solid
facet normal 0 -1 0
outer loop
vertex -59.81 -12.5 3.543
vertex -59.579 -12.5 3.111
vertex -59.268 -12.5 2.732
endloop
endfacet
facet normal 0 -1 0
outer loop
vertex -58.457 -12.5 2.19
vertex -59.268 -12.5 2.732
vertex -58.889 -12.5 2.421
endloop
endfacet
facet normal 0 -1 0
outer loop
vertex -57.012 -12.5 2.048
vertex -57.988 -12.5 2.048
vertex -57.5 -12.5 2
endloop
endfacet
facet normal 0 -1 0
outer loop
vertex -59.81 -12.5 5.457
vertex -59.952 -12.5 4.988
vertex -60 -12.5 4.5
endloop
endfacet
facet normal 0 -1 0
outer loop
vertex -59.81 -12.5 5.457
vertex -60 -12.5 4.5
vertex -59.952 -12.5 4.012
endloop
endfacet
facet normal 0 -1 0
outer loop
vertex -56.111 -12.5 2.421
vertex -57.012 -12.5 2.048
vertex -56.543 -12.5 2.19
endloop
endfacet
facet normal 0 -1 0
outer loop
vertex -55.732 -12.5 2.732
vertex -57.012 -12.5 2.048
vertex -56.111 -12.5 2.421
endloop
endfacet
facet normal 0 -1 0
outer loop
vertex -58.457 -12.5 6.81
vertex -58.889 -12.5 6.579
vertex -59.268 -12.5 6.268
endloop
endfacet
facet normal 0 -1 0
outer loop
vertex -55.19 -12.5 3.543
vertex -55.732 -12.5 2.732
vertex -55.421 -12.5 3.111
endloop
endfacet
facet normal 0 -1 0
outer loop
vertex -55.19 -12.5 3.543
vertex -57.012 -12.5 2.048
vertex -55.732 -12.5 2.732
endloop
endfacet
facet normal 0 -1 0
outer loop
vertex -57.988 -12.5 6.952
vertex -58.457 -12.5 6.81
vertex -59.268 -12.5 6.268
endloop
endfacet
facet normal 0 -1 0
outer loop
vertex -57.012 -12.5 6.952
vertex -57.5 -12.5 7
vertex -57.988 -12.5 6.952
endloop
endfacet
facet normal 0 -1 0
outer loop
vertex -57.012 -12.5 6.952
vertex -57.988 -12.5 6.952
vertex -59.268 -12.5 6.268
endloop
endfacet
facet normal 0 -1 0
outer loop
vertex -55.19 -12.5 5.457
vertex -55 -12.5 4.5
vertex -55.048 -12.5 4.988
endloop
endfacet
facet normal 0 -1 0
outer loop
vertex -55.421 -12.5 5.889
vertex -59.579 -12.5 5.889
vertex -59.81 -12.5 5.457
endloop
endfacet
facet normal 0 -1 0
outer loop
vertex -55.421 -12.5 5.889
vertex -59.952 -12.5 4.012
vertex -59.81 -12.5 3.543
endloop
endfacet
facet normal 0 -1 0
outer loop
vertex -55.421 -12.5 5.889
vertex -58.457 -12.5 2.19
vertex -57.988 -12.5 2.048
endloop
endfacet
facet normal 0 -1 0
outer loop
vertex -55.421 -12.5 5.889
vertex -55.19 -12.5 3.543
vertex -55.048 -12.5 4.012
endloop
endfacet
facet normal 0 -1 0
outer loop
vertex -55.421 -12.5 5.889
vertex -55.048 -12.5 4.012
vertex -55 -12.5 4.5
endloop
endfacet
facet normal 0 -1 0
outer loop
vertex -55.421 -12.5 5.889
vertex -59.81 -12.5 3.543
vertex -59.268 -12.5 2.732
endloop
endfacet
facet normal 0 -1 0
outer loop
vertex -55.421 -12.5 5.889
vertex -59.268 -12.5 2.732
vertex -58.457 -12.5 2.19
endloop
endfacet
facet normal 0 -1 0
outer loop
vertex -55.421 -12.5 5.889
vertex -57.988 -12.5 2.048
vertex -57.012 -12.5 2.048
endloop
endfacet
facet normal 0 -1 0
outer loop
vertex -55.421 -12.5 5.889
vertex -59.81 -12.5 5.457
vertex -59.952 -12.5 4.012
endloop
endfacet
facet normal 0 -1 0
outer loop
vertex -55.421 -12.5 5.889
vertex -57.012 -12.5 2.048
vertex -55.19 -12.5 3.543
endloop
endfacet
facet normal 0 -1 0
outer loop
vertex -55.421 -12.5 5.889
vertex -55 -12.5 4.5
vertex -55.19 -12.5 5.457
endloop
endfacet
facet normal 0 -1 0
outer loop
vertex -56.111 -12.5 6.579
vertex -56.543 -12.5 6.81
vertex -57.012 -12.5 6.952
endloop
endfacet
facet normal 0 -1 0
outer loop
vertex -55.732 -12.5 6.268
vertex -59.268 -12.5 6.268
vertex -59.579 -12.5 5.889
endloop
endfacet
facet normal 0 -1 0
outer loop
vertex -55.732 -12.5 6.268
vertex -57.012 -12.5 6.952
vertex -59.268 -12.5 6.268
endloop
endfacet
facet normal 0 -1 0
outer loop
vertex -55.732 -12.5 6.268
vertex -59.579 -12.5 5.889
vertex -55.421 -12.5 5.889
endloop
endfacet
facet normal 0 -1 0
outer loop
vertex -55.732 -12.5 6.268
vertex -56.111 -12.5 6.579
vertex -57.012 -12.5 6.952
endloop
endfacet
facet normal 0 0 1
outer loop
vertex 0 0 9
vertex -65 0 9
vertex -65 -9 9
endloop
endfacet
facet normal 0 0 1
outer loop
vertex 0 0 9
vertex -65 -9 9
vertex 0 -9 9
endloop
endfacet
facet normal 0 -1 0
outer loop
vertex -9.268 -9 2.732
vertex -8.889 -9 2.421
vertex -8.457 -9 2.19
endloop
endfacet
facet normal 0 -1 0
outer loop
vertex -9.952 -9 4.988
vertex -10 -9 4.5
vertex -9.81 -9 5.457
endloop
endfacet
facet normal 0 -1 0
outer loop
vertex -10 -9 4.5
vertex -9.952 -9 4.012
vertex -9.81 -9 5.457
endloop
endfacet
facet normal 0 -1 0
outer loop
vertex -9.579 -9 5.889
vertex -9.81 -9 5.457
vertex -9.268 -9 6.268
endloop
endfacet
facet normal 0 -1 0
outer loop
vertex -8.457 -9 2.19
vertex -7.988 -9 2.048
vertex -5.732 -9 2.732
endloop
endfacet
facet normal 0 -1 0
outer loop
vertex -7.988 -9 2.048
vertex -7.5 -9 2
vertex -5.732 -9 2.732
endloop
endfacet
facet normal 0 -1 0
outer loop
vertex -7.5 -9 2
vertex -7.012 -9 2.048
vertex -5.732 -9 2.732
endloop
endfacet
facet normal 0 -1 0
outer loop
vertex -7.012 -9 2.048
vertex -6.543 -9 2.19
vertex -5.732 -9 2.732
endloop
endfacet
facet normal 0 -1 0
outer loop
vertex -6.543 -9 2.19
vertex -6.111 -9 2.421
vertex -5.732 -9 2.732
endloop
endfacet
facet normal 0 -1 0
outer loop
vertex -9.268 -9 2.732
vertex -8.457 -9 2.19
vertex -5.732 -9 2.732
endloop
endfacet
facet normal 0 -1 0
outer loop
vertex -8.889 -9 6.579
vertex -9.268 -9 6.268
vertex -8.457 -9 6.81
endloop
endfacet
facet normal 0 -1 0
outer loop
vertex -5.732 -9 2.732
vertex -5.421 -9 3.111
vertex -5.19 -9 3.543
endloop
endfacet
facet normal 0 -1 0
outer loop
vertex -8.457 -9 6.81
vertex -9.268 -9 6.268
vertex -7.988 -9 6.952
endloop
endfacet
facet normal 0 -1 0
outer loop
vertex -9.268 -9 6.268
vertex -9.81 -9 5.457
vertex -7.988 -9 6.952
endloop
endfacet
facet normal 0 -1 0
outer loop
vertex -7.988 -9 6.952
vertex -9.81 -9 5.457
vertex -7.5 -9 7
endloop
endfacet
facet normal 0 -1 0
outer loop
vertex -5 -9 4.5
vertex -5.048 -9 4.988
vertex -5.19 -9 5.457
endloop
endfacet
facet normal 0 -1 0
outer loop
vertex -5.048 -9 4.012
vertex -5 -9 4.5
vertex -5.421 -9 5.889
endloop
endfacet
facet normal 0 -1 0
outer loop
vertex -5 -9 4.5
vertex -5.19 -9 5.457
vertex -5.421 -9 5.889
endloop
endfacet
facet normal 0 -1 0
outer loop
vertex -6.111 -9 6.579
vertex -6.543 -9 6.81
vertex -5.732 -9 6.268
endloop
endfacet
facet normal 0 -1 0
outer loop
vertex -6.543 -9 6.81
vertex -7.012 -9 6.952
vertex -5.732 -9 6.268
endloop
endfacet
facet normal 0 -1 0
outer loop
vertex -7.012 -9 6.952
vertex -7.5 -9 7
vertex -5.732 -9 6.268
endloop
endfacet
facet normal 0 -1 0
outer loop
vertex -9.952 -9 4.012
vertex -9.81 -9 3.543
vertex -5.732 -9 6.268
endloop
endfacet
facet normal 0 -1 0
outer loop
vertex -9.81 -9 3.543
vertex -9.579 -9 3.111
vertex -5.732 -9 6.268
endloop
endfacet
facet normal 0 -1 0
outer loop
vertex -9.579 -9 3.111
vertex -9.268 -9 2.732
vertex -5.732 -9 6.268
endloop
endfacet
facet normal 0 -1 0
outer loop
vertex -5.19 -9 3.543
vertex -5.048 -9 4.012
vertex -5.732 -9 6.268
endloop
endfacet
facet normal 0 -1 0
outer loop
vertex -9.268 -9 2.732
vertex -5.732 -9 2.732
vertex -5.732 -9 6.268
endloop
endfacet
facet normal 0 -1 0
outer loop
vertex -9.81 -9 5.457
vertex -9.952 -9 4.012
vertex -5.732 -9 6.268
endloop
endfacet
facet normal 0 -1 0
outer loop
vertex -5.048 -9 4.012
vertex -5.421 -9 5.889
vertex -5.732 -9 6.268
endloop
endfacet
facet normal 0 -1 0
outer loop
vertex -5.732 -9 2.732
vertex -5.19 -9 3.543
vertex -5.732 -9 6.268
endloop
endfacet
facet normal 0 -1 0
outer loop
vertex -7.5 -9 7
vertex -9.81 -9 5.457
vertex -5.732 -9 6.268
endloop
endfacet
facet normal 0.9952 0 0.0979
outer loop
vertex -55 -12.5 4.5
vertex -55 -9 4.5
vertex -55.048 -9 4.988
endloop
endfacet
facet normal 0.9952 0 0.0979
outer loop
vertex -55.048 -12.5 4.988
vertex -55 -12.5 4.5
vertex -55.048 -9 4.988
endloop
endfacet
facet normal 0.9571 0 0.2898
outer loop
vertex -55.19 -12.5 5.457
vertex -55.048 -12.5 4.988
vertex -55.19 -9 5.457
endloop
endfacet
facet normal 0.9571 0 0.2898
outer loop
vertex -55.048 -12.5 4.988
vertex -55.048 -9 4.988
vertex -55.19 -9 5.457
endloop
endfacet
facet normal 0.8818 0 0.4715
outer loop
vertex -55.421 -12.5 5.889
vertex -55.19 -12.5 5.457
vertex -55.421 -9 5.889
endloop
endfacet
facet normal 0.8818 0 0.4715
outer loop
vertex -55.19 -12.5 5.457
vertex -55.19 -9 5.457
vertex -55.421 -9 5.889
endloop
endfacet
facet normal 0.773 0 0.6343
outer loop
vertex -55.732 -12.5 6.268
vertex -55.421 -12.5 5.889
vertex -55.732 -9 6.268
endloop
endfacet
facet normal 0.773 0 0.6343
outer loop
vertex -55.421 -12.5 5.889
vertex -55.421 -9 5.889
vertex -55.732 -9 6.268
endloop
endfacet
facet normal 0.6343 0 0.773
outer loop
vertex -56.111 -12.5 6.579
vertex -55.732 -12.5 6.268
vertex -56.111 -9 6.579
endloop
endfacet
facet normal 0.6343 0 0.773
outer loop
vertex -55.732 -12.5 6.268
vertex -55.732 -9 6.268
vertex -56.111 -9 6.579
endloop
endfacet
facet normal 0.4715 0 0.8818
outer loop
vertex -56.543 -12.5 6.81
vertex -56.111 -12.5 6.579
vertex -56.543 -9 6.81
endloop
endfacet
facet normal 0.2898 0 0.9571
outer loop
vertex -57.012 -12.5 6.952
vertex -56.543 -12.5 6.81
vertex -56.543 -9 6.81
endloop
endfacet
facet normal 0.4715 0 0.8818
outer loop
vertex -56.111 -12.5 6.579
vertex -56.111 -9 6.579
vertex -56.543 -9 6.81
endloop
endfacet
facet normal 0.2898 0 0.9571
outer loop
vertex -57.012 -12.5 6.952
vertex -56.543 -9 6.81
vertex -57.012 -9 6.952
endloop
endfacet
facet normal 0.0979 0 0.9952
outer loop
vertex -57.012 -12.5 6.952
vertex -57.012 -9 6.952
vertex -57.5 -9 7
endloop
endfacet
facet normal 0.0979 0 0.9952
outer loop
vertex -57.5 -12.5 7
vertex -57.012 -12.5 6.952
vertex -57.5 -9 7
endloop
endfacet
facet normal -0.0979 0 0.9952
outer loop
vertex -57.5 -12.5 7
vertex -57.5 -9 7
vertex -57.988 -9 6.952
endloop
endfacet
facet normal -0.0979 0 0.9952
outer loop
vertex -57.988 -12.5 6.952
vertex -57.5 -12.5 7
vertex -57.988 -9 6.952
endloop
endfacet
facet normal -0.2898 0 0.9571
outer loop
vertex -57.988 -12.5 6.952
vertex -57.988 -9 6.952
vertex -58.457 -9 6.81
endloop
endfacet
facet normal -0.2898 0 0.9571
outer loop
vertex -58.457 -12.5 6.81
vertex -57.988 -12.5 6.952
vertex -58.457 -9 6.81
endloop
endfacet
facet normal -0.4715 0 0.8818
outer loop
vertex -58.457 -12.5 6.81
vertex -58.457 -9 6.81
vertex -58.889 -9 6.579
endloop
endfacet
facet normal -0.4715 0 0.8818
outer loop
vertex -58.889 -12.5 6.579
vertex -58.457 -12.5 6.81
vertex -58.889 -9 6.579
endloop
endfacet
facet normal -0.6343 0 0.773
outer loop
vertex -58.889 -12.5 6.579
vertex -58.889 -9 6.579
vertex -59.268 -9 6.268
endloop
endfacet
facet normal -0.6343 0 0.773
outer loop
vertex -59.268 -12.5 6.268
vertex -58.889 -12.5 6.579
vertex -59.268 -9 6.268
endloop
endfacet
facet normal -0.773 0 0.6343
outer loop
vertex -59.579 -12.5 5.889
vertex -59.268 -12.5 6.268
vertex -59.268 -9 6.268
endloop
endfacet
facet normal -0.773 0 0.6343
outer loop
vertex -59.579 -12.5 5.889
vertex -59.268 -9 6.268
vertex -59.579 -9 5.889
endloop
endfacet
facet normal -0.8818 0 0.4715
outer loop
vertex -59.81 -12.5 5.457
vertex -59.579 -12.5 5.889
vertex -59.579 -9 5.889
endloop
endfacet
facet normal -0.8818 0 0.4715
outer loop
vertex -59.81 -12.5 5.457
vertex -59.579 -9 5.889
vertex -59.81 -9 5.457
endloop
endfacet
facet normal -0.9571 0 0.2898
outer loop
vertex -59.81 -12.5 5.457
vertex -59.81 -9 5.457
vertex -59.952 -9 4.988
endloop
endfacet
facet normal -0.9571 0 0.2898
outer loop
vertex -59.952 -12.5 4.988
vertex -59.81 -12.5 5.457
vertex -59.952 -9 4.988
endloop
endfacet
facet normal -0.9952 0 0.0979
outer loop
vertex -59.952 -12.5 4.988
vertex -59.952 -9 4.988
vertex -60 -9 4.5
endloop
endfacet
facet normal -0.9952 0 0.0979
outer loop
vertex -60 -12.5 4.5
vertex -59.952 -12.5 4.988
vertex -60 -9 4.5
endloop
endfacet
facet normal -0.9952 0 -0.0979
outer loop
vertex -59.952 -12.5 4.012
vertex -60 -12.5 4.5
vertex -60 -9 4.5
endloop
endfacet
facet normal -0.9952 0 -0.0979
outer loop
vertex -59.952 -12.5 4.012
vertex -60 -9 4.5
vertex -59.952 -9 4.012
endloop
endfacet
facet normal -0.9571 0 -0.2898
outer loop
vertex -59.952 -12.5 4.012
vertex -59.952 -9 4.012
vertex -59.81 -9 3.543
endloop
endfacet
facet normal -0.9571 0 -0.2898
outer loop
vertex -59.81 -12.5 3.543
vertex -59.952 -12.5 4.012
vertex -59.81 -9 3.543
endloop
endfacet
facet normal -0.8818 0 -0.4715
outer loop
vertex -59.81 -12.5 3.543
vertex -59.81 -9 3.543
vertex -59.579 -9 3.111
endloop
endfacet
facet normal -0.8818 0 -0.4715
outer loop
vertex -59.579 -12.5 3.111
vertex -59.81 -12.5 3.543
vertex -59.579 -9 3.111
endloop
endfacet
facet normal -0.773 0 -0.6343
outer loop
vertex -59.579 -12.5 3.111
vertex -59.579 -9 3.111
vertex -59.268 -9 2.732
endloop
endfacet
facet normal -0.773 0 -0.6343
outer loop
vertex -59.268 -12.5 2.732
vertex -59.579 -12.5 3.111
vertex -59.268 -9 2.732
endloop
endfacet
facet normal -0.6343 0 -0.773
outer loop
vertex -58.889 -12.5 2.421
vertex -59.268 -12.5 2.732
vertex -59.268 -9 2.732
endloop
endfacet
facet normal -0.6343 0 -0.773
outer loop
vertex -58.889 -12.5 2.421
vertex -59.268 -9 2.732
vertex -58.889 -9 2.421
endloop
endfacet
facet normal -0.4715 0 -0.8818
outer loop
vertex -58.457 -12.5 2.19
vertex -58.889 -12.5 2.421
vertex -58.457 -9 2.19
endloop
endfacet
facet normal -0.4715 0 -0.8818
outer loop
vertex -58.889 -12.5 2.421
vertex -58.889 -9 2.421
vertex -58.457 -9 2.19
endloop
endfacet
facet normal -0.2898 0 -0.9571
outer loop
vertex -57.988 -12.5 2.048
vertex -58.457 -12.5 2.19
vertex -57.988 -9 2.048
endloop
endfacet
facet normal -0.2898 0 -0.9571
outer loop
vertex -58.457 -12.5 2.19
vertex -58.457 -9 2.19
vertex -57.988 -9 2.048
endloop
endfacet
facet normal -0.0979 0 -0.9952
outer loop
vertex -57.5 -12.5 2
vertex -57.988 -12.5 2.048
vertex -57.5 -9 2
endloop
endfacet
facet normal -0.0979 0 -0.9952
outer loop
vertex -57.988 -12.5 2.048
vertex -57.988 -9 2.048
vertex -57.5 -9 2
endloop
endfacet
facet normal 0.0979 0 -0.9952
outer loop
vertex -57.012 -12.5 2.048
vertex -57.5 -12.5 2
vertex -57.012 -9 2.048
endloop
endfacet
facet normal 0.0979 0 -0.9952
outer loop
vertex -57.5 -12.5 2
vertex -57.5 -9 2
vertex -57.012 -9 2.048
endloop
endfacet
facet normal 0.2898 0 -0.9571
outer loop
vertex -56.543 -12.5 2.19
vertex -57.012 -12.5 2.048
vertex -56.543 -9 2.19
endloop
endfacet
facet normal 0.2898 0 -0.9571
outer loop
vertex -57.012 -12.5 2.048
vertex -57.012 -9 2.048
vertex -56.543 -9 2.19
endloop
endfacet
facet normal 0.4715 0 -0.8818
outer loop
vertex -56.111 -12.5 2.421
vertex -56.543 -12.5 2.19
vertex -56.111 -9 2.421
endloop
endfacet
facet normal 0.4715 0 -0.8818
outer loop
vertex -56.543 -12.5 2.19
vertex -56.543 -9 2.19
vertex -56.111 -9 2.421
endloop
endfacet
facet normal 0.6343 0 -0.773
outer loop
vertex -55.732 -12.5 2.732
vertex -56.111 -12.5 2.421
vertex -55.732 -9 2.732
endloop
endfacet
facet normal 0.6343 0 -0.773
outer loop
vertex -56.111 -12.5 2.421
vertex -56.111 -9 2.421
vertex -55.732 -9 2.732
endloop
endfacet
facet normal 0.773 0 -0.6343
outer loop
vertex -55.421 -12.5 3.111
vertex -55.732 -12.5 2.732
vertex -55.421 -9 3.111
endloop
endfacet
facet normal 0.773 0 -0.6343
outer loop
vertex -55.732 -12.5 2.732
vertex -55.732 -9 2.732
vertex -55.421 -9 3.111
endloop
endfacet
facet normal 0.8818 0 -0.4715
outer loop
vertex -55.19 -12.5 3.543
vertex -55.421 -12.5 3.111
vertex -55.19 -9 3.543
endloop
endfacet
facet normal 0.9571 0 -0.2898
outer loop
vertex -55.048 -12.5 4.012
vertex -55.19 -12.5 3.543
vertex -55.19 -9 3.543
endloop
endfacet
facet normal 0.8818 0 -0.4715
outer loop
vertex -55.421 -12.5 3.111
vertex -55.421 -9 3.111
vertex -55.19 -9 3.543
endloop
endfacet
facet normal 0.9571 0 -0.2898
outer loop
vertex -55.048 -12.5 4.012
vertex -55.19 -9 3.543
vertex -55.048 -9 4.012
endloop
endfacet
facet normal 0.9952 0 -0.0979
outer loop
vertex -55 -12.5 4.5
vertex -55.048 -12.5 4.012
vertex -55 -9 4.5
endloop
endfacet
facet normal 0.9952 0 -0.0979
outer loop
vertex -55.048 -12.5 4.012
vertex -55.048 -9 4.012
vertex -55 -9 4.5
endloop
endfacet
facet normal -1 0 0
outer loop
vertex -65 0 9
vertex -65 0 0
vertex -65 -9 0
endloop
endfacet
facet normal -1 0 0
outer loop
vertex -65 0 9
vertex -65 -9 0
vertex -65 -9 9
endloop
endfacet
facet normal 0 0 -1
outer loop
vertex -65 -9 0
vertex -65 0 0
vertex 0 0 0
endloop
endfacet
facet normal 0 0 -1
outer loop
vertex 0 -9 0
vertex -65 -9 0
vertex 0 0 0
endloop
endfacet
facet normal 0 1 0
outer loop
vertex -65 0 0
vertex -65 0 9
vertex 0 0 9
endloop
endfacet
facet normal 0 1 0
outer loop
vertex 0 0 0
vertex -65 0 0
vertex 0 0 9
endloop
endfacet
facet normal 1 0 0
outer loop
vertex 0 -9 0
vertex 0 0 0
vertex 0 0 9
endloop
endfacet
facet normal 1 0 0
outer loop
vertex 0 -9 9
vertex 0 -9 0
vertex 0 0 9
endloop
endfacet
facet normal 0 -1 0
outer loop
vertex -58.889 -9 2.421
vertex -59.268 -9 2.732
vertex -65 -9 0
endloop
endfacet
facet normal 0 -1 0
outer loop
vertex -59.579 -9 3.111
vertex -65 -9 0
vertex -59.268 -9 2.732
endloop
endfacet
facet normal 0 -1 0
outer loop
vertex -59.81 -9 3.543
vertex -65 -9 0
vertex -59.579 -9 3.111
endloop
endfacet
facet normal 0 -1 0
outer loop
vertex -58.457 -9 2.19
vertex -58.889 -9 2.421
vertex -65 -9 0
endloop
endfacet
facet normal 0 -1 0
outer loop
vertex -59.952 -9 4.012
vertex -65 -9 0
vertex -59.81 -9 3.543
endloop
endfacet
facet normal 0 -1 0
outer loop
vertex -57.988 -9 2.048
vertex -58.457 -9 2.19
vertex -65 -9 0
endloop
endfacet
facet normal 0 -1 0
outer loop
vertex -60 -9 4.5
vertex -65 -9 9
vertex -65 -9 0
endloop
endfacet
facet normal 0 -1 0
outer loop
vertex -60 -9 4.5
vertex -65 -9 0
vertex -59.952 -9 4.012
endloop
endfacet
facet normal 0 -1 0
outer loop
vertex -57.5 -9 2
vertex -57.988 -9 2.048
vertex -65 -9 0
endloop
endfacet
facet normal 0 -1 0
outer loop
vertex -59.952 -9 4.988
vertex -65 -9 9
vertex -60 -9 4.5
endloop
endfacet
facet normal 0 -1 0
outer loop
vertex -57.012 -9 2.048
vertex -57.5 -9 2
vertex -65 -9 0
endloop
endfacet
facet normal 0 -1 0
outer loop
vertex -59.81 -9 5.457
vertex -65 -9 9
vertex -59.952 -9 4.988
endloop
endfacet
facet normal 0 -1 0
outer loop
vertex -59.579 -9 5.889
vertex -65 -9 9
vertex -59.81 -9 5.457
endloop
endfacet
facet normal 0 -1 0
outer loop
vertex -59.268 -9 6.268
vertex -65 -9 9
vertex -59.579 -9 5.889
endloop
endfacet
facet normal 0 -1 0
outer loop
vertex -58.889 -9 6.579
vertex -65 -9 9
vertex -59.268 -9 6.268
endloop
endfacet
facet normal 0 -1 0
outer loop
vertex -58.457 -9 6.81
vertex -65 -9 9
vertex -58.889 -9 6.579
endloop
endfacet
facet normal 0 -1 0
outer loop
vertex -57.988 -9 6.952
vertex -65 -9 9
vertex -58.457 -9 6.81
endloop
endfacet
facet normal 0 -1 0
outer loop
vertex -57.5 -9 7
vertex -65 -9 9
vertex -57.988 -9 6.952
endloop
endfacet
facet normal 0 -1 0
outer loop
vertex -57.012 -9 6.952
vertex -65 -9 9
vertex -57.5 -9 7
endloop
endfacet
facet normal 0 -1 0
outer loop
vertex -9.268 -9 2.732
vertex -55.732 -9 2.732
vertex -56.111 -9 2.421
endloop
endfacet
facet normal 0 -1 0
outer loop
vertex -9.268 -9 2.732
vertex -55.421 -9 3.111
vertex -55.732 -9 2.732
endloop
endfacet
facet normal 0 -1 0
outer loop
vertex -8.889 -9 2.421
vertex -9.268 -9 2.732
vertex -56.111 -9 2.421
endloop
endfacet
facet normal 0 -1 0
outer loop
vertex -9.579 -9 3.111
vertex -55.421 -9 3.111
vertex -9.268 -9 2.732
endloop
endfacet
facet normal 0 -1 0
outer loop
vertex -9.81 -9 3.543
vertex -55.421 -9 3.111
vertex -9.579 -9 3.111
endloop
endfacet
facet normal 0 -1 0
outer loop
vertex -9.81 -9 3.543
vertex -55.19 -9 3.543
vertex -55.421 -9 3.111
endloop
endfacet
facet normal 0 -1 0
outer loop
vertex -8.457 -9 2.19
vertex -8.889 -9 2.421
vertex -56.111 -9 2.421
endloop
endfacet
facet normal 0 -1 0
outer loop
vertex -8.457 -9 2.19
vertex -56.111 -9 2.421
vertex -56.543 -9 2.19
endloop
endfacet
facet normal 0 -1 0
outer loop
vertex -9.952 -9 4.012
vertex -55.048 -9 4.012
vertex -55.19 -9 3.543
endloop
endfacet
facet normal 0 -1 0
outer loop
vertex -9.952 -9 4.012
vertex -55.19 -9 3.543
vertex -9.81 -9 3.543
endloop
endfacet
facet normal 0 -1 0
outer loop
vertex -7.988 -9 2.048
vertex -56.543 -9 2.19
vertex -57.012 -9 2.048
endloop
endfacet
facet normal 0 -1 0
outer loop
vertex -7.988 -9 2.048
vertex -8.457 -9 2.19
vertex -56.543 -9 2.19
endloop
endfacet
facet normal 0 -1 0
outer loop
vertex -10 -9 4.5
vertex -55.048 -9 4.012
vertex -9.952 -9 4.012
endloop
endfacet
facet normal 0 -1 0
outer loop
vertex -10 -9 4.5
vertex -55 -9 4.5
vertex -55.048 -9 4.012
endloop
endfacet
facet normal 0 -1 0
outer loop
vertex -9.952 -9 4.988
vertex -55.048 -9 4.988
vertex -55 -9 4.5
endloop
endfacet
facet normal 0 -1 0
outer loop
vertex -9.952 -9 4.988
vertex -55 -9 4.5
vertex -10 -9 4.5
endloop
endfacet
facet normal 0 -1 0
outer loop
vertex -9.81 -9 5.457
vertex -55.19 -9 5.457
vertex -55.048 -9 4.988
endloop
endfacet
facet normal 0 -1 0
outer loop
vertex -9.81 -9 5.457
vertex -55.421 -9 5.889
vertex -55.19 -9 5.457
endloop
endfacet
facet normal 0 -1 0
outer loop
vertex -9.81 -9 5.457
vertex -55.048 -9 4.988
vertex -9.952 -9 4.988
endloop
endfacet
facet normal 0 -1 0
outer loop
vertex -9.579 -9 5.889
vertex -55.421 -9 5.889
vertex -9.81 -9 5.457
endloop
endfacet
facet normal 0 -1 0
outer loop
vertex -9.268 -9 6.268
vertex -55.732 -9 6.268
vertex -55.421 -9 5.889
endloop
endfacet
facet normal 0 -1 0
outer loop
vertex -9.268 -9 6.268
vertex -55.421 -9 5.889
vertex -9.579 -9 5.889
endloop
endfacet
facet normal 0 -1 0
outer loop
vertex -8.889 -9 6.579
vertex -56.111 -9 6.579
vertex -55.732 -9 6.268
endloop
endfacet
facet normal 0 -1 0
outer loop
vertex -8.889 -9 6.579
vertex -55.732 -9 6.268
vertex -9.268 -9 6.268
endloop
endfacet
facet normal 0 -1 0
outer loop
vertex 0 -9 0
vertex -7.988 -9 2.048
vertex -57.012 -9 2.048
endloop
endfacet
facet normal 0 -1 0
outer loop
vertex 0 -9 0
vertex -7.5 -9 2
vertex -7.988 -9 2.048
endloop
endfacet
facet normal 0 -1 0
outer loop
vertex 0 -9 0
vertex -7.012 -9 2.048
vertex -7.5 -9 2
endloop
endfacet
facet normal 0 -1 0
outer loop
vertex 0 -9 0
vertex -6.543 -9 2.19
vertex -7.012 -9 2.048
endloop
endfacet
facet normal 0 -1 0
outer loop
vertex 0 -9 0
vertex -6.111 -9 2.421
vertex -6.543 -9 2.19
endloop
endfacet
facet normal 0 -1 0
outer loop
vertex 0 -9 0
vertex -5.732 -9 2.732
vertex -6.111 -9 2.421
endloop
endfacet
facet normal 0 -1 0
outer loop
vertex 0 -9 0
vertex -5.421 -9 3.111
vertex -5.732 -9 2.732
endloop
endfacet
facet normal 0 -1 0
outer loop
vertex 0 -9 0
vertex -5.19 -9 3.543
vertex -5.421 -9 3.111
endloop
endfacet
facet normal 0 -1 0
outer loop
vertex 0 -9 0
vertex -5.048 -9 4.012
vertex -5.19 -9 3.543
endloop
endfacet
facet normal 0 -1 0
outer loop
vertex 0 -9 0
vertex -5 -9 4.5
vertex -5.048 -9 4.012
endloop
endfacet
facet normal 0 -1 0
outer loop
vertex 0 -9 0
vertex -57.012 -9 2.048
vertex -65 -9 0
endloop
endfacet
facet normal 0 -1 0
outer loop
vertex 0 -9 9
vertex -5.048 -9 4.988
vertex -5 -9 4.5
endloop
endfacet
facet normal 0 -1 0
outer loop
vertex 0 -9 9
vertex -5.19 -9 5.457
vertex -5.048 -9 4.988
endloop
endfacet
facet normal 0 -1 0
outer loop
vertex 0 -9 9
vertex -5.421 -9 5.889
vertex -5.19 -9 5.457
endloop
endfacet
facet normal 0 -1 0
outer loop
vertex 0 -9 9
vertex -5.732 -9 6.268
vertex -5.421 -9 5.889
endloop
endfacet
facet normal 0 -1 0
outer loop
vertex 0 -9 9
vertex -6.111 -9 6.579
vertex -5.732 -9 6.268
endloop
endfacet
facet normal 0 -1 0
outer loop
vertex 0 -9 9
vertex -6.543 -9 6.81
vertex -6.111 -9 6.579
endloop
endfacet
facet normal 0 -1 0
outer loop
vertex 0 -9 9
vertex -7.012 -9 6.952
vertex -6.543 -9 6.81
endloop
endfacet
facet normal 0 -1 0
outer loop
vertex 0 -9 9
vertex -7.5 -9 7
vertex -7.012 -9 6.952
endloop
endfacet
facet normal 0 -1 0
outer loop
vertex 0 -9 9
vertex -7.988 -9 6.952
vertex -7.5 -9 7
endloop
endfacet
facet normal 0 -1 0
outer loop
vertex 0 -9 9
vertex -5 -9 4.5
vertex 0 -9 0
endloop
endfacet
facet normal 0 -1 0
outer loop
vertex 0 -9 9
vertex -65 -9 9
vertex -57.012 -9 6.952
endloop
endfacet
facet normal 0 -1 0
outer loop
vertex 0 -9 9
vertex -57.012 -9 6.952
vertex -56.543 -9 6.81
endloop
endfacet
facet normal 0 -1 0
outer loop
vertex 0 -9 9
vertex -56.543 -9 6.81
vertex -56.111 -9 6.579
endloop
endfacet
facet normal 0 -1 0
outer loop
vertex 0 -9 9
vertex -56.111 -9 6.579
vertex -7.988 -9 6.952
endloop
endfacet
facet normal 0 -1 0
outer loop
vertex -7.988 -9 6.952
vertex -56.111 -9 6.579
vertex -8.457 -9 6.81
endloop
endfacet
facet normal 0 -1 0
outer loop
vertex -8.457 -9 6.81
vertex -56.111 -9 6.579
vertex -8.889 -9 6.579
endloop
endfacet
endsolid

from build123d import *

# Parameters (mm, degrees)
F0_W     = 65
F0_H     = 9
F0_R     = 2.5
F1_DEPTH = 9
F2_DEPTH = 12.5
F3_W     = 7.776277
F3_H     = 9
F4_DEPTH = 25


with BuildPart() as f1:
    # F0 (on Front) → F1 (new body)
    with BuildSketch(Plane.XZ):
        with Locations((-32.5, 4.5)):
            Rectangle(F0_W, F0_H)
        with Locations((-57.5, 4.5)):
            Circle(F0_R, mode=Mode.SUBTRACT)
        with Locations((-7.5, 4.5)):
            Circle(F0_R, mode=Mode.SUBTRACT)
    extrude(amount=F1_DEPTH)

    # F0 (on Front) → F2 (join)
    with BuildSketch(Plane.XZ):
        with Locations((-57.5, 4.5)):
            Circle(F0_R)
        with Locations((-7.5, 4.5)):
            Circle(F0_R)
    extrude(amount=F2_DEPTH)

    # F3 (on face) → F4 (cut)
    with BuildSketch(Plane.YZ):
        with Locations((-12.888139, 4.5)):
            Rectangle(F3_W, F3_H)
    extrude(amount=-F4_DEPTH, mode=Mode.SUBTRACT)


solid = f1.part
